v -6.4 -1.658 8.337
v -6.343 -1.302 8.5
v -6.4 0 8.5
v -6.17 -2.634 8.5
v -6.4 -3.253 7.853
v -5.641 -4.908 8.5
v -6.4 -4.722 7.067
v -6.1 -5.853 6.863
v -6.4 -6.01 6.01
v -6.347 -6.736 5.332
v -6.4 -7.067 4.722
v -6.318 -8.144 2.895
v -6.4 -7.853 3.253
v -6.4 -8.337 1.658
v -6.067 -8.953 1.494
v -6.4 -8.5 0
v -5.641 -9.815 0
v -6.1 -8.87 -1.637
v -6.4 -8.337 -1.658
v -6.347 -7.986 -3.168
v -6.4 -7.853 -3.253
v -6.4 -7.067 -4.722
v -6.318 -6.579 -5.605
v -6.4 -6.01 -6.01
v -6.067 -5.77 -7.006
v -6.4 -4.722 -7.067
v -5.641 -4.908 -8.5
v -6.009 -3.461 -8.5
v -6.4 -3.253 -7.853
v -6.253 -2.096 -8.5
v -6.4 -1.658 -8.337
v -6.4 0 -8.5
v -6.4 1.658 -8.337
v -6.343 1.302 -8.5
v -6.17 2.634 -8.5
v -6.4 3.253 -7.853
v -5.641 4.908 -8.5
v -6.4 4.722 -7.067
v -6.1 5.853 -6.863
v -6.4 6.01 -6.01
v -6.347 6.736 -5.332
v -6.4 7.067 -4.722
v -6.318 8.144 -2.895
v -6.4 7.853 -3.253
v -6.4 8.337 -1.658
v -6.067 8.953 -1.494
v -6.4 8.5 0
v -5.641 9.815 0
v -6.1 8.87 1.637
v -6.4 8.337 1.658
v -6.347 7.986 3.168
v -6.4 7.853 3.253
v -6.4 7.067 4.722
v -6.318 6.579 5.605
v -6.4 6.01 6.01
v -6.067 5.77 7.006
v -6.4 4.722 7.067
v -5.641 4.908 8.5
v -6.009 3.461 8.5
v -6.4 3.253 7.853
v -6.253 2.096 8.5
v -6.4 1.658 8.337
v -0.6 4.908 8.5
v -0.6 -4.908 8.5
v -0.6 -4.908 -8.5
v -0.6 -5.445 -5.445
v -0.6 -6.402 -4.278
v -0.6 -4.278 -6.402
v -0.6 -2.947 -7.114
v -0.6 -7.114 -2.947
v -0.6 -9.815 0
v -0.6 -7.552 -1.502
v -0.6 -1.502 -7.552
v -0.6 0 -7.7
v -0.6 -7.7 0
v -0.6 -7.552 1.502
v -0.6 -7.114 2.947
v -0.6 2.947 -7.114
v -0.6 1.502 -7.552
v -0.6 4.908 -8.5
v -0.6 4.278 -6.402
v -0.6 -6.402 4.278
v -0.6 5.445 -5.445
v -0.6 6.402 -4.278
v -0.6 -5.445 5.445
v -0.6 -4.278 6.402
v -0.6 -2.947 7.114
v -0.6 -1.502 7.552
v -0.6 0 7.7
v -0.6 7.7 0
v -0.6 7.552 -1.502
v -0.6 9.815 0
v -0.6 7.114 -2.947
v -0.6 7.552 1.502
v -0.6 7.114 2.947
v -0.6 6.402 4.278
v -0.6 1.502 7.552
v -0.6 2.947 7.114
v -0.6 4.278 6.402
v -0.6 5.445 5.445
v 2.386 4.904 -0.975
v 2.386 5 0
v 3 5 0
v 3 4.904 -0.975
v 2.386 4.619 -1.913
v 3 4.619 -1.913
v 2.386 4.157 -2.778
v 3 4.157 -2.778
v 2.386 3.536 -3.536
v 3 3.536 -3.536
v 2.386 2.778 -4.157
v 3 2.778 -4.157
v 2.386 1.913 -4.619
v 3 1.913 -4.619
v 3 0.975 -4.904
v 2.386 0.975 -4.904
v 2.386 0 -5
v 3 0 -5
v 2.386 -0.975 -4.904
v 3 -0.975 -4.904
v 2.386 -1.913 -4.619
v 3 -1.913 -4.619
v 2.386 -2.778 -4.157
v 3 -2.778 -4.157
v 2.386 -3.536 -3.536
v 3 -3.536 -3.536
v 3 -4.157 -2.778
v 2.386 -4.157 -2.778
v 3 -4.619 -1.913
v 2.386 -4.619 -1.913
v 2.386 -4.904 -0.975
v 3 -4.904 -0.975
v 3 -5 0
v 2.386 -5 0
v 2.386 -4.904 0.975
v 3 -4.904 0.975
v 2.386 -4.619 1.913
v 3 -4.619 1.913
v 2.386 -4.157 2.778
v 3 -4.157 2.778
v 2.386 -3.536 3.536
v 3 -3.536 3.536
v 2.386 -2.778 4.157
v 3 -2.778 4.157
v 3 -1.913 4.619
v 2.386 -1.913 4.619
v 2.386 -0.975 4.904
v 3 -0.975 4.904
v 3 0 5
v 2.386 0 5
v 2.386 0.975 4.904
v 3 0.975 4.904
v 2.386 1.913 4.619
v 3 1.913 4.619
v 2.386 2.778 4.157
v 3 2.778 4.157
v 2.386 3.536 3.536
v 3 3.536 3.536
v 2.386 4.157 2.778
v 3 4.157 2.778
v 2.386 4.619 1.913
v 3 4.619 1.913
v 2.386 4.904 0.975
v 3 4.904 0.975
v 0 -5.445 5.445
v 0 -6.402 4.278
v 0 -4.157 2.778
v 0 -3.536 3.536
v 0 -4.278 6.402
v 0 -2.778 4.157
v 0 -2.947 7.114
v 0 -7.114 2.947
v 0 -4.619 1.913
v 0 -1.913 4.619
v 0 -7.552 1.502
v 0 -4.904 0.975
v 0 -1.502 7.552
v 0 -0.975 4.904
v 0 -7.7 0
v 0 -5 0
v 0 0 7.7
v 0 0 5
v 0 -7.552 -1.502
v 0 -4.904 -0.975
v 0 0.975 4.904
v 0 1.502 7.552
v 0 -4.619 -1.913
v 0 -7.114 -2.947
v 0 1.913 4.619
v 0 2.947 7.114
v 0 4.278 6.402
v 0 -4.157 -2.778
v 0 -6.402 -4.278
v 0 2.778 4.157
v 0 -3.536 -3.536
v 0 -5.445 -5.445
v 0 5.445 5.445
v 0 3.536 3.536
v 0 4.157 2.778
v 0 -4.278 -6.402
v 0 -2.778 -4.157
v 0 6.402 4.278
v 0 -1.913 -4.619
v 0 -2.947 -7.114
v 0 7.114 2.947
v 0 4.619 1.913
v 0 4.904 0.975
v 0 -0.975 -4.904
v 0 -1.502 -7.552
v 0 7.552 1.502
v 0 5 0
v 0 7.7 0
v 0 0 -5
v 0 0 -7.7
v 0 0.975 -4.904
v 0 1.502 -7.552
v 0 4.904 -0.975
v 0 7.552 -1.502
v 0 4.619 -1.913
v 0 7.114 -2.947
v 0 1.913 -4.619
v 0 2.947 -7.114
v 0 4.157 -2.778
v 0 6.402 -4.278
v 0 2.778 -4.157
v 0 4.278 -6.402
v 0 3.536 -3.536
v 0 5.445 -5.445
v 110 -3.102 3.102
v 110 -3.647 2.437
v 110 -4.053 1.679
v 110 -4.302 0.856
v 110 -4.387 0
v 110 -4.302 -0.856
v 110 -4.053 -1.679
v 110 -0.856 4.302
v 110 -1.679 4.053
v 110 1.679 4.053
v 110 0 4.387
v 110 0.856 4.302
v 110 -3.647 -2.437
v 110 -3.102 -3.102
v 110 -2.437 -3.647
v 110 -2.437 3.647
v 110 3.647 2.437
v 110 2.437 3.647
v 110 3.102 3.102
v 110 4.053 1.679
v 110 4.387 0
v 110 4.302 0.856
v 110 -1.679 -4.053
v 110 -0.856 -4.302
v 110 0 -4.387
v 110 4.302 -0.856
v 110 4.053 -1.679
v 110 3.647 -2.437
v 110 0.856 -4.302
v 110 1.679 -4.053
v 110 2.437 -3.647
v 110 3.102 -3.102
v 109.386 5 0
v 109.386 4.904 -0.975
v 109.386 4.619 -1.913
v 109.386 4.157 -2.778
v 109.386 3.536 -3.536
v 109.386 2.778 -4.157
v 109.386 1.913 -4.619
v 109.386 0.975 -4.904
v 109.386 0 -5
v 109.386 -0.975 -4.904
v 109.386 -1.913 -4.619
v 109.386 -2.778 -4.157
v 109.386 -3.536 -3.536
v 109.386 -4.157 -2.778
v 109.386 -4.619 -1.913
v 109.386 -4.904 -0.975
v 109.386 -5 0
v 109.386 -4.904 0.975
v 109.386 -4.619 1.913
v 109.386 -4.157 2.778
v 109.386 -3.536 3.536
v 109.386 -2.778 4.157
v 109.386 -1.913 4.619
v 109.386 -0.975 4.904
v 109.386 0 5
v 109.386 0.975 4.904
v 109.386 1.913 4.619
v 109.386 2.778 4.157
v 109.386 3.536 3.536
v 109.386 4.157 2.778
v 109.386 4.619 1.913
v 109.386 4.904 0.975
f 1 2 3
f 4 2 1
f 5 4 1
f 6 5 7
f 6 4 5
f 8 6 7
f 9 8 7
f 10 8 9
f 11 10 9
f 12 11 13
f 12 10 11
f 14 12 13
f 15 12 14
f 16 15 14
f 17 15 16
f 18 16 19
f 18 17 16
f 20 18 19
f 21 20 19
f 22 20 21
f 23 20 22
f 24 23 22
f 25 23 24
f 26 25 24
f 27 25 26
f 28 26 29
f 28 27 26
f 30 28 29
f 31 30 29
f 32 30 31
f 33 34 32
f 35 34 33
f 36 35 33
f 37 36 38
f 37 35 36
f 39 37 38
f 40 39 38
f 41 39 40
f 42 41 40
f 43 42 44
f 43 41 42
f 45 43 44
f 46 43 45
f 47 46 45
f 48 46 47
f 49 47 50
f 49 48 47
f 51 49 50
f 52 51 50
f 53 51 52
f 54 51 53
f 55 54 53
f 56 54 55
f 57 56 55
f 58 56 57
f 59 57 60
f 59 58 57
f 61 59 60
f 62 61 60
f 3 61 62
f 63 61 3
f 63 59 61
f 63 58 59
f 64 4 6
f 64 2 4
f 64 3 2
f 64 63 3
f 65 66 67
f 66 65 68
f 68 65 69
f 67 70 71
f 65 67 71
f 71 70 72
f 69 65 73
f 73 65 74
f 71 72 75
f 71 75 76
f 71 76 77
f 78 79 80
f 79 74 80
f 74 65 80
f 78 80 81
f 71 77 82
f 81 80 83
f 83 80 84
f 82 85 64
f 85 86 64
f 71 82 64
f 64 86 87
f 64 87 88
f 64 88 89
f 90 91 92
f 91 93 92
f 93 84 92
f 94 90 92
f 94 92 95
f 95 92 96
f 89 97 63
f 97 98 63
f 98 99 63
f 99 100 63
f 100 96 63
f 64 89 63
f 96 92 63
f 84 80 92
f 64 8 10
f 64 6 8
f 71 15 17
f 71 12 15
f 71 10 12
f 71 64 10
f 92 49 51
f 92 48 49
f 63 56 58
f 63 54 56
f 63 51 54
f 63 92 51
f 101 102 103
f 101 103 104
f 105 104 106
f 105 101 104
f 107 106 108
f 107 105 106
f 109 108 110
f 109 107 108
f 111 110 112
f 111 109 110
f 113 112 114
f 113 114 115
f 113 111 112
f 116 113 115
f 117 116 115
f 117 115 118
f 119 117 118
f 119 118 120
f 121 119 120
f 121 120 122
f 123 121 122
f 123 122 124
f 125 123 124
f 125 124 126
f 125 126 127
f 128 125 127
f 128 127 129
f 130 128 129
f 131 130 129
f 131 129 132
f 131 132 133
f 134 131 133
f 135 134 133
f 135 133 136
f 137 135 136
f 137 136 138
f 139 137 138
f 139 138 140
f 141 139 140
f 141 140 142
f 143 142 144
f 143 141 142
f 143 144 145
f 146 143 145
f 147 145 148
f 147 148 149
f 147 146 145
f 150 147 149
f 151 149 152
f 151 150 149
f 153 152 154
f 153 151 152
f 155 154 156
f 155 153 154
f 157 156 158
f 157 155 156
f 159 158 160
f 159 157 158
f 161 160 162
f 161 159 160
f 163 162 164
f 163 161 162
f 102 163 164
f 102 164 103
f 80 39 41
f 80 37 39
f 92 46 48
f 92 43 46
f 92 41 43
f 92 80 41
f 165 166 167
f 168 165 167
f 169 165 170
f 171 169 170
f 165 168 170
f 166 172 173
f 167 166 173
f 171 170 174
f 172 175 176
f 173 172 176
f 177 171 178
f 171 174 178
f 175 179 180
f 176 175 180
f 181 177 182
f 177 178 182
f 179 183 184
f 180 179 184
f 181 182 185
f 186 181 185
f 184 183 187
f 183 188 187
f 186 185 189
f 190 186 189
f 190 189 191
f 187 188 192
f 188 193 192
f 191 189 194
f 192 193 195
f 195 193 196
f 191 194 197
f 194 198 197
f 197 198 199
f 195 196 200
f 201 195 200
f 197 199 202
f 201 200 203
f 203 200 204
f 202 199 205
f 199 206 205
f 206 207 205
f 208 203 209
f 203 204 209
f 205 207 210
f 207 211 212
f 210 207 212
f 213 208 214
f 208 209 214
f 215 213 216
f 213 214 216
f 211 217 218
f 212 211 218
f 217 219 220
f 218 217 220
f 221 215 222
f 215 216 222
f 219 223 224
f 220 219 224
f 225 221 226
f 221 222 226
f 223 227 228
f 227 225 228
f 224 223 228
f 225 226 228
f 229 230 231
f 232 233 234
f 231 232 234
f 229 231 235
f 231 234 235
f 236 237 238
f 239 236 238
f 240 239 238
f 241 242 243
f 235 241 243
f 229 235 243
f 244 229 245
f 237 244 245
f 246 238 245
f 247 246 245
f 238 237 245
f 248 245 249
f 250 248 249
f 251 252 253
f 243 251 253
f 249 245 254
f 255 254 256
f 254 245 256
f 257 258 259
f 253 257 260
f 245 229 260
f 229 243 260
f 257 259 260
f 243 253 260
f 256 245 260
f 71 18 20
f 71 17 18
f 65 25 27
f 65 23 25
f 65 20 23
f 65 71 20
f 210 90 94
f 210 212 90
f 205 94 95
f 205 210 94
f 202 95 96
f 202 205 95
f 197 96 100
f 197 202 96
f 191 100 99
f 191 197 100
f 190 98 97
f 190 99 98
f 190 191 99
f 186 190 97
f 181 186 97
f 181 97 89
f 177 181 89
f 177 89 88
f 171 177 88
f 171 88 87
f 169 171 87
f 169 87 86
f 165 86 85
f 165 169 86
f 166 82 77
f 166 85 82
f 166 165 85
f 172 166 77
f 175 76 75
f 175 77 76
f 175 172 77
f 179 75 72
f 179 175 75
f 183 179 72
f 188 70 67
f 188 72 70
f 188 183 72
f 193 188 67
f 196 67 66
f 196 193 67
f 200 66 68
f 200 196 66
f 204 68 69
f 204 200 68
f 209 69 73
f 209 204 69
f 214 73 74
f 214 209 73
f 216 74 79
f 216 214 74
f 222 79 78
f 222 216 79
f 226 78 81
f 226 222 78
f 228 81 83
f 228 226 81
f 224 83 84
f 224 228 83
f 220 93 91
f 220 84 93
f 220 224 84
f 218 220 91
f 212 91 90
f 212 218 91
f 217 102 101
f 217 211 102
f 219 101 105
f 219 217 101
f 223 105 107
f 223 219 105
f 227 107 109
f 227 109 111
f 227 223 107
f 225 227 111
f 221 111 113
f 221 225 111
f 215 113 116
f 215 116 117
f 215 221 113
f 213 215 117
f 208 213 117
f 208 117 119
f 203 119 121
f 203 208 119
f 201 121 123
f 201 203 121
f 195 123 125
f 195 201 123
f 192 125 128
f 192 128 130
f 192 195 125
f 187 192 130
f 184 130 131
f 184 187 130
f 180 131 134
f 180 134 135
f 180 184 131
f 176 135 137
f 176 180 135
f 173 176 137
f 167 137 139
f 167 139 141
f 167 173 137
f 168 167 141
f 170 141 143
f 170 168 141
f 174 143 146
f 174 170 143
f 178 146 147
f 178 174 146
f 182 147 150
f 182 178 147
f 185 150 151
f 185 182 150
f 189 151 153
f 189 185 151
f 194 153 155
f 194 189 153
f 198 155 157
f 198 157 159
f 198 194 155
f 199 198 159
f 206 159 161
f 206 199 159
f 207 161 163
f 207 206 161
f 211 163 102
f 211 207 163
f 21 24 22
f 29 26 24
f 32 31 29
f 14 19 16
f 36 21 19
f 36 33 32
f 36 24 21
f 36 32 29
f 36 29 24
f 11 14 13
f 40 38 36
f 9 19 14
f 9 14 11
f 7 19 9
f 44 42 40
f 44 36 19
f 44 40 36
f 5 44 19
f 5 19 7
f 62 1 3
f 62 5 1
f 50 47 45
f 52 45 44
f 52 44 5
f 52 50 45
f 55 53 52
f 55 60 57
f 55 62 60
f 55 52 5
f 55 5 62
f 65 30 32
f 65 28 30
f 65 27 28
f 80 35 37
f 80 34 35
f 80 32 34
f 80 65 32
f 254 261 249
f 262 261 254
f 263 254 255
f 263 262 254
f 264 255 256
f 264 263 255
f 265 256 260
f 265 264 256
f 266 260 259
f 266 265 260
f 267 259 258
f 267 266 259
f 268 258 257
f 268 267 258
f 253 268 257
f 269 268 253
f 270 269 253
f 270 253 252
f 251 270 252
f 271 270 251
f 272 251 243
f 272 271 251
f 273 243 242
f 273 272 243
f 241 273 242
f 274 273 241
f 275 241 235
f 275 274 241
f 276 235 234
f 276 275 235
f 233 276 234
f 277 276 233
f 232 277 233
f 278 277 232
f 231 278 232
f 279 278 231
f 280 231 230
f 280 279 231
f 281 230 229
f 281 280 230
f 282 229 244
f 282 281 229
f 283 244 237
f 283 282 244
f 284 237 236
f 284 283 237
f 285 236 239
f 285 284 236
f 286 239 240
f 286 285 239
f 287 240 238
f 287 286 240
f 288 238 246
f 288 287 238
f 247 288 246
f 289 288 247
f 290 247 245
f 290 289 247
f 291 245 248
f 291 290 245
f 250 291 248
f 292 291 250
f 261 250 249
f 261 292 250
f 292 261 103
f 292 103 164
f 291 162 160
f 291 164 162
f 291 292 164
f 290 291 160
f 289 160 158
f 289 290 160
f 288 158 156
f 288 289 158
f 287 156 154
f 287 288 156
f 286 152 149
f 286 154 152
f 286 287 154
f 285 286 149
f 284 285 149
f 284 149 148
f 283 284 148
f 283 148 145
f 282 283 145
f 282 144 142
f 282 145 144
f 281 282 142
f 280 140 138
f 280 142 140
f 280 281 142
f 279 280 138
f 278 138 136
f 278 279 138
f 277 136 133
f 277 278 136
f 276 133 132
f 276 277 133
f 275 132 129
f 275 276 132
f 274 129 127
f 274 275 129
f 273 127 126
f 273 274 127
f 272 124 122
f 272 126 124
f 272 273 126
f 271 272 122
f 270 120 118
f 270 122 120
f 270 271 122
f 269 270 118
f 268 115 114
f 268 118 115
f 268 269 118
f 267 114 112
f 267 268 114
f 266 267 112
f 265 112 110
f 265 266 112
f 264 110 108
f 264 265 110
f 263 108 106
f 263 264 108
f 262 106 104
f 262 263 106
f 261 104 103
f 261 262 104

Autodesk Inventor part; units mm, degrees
ref_plane "YZ Plane" through (0, 0, 0) normal (1, 0, 0) x (0, 1, 0)
ref_plane "XZ Plane" through (0, 0, 0) normal (0, 1, 0) x (-1, 0, 0)
sketch "Sketch1" plane through (0, 0, 0) normal (0, 0, 1) x (1, 0, 0)
  line L0 (0, 7.7) -> (0, 5)
  line L1 (3, 5) -> (110, 5)
  line L2 (110, 5) -> (110, 0)
  line L3 (110, 0) -> (-0.6001, 0)
  line L4 (-22.7201, 0) -> (132.12, 0) projected
  line L5 (-0.6001, 0) -> (-0.6001, 7.7)
  line L6 (-0.6001, 7.7) -> (0, 7.7)
  line L7 (3, 5) -> (2.3864, 5)
  line L8 (2.3864, 5) -> (0, 5)
  line L9 (0, -1.54) -> (0, 9.24) projected
  dimension "d0" = 110
  dimension "d1" = 107
  dimension "d2" = 10
  dimension "d9" = 0.6001
  dimension "d10" = 15.4
  dimension "d13" = 0.6136
  dimension "d14" = 10
revolve "Body" add sketch "Sketch1" angle 360 about axis through (110, 0, 0) along (-1, 0, 0)
sketch "Sketch2" plane through (-0.6001, 0, 0) normal (-1, 0, 0) x (0, 0, 1)
  line L0 (0, 9.815) -> (8.5, 4.9075)
  line L1 (8.5, 4.9075) -> (8.5, -4.9075)
  line L2 (8.5, -4.9075) -> (0, -9.815)
  line L3 (0, -9.815) -> (-8.5, -4.9075)
  line L4 (-8.5, -4.9075) -> (-8.5, 4.9075)
  line L5 (-8.5, 4.9075) -> (0, 9.815)
  point P0 (0, 0)
  point P1 (0, 0)
  dimension "d11" = 17
extrude "Head" add sketch "Sketch2" along normal blind 5.8
sketch "Sketch4" plane through (0, 0, 0) normal (0, 0, 1) x (1, 0, 0)
  line L0 (-6.4001, 8.5) -> (-6.4001, 9.815)
  line L1 (-6.4001, 9.815) -> (-5.6409, 9.815)
  line L2 (-5.6409, 9.815) -> (-6.4001, 8.5)
  line L3 (-7.5601, 0) -> (0.5599, 0) projected
  line L4 (-0.6001, 9.815) -> (-6.4001, 9.815) projected
  line L5 (-6.4001, 4.9075) -> (-6.4001, 9.815) projected
  dimension "d5" = 30
  dimension "d19" = 17
revolve "Chamfer1" cut sketch "Sketch4" angle 360 about axis through (-10, 0, 0) along (1, 0, 0)
thread "Thread" size "M10x1" class "6g" standard "ISO Metric profile" length 107
chamfer "Chamfer2" distance 0.6134 distance2 0.6136 1 edges at (110, -5, 0) measured on face at (110, 0.591, 1.1849)
ref_plane "Work Plane1" through (1.525, 0, 0) normal (0, 0, 1) x (1, 0, 0)
equation "\"d0\" = NLG"
equation "\"d1\" = GEL"
equation "\"d2\" = GD"
equation "\"d10\" = SD2"
equation "\"d14\" = BDM"
equation "\"d11\" = SW"
equation "\"d3\" = KOH - SD"
equation "\"d5\" = ANG1"
equation "\"d19\" = SW0"
equation "\"d15\" = GEL"
equation "\"d6\" = -0.5 * SPD + 0.5 * GD"
equation "\"NLG\" = 110"
equation "\"GD\" = NND"
equation "\"BDM\" = NND"
equation "\"KOH\" = 6.4"
equation "\"GEL\" = 107"
equation "\"SW\" = 17"
equation "\"SW0\" = 17"
equation "\"SPD\" = NND - 1.2269 * PTC"
equation "\"SD2\" = 15.4"
equation "\"SD\" = 0.6"
equation "\"ANG1\" = 30deg"
equation "\"GAL\" = 0.61345 * PTC"
equation "\"GUL\" = 0.61345 * PTC"
equation "\"RR\" = 0"
equation "\"GD1\" = THREADDIA - 1.2269 * PTC"
equation "\"TOA\" = 30deg"
equation "\"FAWI\" = 45deg"
equation "\"PTC\" = 1"
equation "\"E0\" = 1.155 * SW"
equation "\"NND\" = 10"
equation "\"THREADDIA\" = 10"
properties part number "DIN 961 - M10 x 110" material "Steel, Mild"
